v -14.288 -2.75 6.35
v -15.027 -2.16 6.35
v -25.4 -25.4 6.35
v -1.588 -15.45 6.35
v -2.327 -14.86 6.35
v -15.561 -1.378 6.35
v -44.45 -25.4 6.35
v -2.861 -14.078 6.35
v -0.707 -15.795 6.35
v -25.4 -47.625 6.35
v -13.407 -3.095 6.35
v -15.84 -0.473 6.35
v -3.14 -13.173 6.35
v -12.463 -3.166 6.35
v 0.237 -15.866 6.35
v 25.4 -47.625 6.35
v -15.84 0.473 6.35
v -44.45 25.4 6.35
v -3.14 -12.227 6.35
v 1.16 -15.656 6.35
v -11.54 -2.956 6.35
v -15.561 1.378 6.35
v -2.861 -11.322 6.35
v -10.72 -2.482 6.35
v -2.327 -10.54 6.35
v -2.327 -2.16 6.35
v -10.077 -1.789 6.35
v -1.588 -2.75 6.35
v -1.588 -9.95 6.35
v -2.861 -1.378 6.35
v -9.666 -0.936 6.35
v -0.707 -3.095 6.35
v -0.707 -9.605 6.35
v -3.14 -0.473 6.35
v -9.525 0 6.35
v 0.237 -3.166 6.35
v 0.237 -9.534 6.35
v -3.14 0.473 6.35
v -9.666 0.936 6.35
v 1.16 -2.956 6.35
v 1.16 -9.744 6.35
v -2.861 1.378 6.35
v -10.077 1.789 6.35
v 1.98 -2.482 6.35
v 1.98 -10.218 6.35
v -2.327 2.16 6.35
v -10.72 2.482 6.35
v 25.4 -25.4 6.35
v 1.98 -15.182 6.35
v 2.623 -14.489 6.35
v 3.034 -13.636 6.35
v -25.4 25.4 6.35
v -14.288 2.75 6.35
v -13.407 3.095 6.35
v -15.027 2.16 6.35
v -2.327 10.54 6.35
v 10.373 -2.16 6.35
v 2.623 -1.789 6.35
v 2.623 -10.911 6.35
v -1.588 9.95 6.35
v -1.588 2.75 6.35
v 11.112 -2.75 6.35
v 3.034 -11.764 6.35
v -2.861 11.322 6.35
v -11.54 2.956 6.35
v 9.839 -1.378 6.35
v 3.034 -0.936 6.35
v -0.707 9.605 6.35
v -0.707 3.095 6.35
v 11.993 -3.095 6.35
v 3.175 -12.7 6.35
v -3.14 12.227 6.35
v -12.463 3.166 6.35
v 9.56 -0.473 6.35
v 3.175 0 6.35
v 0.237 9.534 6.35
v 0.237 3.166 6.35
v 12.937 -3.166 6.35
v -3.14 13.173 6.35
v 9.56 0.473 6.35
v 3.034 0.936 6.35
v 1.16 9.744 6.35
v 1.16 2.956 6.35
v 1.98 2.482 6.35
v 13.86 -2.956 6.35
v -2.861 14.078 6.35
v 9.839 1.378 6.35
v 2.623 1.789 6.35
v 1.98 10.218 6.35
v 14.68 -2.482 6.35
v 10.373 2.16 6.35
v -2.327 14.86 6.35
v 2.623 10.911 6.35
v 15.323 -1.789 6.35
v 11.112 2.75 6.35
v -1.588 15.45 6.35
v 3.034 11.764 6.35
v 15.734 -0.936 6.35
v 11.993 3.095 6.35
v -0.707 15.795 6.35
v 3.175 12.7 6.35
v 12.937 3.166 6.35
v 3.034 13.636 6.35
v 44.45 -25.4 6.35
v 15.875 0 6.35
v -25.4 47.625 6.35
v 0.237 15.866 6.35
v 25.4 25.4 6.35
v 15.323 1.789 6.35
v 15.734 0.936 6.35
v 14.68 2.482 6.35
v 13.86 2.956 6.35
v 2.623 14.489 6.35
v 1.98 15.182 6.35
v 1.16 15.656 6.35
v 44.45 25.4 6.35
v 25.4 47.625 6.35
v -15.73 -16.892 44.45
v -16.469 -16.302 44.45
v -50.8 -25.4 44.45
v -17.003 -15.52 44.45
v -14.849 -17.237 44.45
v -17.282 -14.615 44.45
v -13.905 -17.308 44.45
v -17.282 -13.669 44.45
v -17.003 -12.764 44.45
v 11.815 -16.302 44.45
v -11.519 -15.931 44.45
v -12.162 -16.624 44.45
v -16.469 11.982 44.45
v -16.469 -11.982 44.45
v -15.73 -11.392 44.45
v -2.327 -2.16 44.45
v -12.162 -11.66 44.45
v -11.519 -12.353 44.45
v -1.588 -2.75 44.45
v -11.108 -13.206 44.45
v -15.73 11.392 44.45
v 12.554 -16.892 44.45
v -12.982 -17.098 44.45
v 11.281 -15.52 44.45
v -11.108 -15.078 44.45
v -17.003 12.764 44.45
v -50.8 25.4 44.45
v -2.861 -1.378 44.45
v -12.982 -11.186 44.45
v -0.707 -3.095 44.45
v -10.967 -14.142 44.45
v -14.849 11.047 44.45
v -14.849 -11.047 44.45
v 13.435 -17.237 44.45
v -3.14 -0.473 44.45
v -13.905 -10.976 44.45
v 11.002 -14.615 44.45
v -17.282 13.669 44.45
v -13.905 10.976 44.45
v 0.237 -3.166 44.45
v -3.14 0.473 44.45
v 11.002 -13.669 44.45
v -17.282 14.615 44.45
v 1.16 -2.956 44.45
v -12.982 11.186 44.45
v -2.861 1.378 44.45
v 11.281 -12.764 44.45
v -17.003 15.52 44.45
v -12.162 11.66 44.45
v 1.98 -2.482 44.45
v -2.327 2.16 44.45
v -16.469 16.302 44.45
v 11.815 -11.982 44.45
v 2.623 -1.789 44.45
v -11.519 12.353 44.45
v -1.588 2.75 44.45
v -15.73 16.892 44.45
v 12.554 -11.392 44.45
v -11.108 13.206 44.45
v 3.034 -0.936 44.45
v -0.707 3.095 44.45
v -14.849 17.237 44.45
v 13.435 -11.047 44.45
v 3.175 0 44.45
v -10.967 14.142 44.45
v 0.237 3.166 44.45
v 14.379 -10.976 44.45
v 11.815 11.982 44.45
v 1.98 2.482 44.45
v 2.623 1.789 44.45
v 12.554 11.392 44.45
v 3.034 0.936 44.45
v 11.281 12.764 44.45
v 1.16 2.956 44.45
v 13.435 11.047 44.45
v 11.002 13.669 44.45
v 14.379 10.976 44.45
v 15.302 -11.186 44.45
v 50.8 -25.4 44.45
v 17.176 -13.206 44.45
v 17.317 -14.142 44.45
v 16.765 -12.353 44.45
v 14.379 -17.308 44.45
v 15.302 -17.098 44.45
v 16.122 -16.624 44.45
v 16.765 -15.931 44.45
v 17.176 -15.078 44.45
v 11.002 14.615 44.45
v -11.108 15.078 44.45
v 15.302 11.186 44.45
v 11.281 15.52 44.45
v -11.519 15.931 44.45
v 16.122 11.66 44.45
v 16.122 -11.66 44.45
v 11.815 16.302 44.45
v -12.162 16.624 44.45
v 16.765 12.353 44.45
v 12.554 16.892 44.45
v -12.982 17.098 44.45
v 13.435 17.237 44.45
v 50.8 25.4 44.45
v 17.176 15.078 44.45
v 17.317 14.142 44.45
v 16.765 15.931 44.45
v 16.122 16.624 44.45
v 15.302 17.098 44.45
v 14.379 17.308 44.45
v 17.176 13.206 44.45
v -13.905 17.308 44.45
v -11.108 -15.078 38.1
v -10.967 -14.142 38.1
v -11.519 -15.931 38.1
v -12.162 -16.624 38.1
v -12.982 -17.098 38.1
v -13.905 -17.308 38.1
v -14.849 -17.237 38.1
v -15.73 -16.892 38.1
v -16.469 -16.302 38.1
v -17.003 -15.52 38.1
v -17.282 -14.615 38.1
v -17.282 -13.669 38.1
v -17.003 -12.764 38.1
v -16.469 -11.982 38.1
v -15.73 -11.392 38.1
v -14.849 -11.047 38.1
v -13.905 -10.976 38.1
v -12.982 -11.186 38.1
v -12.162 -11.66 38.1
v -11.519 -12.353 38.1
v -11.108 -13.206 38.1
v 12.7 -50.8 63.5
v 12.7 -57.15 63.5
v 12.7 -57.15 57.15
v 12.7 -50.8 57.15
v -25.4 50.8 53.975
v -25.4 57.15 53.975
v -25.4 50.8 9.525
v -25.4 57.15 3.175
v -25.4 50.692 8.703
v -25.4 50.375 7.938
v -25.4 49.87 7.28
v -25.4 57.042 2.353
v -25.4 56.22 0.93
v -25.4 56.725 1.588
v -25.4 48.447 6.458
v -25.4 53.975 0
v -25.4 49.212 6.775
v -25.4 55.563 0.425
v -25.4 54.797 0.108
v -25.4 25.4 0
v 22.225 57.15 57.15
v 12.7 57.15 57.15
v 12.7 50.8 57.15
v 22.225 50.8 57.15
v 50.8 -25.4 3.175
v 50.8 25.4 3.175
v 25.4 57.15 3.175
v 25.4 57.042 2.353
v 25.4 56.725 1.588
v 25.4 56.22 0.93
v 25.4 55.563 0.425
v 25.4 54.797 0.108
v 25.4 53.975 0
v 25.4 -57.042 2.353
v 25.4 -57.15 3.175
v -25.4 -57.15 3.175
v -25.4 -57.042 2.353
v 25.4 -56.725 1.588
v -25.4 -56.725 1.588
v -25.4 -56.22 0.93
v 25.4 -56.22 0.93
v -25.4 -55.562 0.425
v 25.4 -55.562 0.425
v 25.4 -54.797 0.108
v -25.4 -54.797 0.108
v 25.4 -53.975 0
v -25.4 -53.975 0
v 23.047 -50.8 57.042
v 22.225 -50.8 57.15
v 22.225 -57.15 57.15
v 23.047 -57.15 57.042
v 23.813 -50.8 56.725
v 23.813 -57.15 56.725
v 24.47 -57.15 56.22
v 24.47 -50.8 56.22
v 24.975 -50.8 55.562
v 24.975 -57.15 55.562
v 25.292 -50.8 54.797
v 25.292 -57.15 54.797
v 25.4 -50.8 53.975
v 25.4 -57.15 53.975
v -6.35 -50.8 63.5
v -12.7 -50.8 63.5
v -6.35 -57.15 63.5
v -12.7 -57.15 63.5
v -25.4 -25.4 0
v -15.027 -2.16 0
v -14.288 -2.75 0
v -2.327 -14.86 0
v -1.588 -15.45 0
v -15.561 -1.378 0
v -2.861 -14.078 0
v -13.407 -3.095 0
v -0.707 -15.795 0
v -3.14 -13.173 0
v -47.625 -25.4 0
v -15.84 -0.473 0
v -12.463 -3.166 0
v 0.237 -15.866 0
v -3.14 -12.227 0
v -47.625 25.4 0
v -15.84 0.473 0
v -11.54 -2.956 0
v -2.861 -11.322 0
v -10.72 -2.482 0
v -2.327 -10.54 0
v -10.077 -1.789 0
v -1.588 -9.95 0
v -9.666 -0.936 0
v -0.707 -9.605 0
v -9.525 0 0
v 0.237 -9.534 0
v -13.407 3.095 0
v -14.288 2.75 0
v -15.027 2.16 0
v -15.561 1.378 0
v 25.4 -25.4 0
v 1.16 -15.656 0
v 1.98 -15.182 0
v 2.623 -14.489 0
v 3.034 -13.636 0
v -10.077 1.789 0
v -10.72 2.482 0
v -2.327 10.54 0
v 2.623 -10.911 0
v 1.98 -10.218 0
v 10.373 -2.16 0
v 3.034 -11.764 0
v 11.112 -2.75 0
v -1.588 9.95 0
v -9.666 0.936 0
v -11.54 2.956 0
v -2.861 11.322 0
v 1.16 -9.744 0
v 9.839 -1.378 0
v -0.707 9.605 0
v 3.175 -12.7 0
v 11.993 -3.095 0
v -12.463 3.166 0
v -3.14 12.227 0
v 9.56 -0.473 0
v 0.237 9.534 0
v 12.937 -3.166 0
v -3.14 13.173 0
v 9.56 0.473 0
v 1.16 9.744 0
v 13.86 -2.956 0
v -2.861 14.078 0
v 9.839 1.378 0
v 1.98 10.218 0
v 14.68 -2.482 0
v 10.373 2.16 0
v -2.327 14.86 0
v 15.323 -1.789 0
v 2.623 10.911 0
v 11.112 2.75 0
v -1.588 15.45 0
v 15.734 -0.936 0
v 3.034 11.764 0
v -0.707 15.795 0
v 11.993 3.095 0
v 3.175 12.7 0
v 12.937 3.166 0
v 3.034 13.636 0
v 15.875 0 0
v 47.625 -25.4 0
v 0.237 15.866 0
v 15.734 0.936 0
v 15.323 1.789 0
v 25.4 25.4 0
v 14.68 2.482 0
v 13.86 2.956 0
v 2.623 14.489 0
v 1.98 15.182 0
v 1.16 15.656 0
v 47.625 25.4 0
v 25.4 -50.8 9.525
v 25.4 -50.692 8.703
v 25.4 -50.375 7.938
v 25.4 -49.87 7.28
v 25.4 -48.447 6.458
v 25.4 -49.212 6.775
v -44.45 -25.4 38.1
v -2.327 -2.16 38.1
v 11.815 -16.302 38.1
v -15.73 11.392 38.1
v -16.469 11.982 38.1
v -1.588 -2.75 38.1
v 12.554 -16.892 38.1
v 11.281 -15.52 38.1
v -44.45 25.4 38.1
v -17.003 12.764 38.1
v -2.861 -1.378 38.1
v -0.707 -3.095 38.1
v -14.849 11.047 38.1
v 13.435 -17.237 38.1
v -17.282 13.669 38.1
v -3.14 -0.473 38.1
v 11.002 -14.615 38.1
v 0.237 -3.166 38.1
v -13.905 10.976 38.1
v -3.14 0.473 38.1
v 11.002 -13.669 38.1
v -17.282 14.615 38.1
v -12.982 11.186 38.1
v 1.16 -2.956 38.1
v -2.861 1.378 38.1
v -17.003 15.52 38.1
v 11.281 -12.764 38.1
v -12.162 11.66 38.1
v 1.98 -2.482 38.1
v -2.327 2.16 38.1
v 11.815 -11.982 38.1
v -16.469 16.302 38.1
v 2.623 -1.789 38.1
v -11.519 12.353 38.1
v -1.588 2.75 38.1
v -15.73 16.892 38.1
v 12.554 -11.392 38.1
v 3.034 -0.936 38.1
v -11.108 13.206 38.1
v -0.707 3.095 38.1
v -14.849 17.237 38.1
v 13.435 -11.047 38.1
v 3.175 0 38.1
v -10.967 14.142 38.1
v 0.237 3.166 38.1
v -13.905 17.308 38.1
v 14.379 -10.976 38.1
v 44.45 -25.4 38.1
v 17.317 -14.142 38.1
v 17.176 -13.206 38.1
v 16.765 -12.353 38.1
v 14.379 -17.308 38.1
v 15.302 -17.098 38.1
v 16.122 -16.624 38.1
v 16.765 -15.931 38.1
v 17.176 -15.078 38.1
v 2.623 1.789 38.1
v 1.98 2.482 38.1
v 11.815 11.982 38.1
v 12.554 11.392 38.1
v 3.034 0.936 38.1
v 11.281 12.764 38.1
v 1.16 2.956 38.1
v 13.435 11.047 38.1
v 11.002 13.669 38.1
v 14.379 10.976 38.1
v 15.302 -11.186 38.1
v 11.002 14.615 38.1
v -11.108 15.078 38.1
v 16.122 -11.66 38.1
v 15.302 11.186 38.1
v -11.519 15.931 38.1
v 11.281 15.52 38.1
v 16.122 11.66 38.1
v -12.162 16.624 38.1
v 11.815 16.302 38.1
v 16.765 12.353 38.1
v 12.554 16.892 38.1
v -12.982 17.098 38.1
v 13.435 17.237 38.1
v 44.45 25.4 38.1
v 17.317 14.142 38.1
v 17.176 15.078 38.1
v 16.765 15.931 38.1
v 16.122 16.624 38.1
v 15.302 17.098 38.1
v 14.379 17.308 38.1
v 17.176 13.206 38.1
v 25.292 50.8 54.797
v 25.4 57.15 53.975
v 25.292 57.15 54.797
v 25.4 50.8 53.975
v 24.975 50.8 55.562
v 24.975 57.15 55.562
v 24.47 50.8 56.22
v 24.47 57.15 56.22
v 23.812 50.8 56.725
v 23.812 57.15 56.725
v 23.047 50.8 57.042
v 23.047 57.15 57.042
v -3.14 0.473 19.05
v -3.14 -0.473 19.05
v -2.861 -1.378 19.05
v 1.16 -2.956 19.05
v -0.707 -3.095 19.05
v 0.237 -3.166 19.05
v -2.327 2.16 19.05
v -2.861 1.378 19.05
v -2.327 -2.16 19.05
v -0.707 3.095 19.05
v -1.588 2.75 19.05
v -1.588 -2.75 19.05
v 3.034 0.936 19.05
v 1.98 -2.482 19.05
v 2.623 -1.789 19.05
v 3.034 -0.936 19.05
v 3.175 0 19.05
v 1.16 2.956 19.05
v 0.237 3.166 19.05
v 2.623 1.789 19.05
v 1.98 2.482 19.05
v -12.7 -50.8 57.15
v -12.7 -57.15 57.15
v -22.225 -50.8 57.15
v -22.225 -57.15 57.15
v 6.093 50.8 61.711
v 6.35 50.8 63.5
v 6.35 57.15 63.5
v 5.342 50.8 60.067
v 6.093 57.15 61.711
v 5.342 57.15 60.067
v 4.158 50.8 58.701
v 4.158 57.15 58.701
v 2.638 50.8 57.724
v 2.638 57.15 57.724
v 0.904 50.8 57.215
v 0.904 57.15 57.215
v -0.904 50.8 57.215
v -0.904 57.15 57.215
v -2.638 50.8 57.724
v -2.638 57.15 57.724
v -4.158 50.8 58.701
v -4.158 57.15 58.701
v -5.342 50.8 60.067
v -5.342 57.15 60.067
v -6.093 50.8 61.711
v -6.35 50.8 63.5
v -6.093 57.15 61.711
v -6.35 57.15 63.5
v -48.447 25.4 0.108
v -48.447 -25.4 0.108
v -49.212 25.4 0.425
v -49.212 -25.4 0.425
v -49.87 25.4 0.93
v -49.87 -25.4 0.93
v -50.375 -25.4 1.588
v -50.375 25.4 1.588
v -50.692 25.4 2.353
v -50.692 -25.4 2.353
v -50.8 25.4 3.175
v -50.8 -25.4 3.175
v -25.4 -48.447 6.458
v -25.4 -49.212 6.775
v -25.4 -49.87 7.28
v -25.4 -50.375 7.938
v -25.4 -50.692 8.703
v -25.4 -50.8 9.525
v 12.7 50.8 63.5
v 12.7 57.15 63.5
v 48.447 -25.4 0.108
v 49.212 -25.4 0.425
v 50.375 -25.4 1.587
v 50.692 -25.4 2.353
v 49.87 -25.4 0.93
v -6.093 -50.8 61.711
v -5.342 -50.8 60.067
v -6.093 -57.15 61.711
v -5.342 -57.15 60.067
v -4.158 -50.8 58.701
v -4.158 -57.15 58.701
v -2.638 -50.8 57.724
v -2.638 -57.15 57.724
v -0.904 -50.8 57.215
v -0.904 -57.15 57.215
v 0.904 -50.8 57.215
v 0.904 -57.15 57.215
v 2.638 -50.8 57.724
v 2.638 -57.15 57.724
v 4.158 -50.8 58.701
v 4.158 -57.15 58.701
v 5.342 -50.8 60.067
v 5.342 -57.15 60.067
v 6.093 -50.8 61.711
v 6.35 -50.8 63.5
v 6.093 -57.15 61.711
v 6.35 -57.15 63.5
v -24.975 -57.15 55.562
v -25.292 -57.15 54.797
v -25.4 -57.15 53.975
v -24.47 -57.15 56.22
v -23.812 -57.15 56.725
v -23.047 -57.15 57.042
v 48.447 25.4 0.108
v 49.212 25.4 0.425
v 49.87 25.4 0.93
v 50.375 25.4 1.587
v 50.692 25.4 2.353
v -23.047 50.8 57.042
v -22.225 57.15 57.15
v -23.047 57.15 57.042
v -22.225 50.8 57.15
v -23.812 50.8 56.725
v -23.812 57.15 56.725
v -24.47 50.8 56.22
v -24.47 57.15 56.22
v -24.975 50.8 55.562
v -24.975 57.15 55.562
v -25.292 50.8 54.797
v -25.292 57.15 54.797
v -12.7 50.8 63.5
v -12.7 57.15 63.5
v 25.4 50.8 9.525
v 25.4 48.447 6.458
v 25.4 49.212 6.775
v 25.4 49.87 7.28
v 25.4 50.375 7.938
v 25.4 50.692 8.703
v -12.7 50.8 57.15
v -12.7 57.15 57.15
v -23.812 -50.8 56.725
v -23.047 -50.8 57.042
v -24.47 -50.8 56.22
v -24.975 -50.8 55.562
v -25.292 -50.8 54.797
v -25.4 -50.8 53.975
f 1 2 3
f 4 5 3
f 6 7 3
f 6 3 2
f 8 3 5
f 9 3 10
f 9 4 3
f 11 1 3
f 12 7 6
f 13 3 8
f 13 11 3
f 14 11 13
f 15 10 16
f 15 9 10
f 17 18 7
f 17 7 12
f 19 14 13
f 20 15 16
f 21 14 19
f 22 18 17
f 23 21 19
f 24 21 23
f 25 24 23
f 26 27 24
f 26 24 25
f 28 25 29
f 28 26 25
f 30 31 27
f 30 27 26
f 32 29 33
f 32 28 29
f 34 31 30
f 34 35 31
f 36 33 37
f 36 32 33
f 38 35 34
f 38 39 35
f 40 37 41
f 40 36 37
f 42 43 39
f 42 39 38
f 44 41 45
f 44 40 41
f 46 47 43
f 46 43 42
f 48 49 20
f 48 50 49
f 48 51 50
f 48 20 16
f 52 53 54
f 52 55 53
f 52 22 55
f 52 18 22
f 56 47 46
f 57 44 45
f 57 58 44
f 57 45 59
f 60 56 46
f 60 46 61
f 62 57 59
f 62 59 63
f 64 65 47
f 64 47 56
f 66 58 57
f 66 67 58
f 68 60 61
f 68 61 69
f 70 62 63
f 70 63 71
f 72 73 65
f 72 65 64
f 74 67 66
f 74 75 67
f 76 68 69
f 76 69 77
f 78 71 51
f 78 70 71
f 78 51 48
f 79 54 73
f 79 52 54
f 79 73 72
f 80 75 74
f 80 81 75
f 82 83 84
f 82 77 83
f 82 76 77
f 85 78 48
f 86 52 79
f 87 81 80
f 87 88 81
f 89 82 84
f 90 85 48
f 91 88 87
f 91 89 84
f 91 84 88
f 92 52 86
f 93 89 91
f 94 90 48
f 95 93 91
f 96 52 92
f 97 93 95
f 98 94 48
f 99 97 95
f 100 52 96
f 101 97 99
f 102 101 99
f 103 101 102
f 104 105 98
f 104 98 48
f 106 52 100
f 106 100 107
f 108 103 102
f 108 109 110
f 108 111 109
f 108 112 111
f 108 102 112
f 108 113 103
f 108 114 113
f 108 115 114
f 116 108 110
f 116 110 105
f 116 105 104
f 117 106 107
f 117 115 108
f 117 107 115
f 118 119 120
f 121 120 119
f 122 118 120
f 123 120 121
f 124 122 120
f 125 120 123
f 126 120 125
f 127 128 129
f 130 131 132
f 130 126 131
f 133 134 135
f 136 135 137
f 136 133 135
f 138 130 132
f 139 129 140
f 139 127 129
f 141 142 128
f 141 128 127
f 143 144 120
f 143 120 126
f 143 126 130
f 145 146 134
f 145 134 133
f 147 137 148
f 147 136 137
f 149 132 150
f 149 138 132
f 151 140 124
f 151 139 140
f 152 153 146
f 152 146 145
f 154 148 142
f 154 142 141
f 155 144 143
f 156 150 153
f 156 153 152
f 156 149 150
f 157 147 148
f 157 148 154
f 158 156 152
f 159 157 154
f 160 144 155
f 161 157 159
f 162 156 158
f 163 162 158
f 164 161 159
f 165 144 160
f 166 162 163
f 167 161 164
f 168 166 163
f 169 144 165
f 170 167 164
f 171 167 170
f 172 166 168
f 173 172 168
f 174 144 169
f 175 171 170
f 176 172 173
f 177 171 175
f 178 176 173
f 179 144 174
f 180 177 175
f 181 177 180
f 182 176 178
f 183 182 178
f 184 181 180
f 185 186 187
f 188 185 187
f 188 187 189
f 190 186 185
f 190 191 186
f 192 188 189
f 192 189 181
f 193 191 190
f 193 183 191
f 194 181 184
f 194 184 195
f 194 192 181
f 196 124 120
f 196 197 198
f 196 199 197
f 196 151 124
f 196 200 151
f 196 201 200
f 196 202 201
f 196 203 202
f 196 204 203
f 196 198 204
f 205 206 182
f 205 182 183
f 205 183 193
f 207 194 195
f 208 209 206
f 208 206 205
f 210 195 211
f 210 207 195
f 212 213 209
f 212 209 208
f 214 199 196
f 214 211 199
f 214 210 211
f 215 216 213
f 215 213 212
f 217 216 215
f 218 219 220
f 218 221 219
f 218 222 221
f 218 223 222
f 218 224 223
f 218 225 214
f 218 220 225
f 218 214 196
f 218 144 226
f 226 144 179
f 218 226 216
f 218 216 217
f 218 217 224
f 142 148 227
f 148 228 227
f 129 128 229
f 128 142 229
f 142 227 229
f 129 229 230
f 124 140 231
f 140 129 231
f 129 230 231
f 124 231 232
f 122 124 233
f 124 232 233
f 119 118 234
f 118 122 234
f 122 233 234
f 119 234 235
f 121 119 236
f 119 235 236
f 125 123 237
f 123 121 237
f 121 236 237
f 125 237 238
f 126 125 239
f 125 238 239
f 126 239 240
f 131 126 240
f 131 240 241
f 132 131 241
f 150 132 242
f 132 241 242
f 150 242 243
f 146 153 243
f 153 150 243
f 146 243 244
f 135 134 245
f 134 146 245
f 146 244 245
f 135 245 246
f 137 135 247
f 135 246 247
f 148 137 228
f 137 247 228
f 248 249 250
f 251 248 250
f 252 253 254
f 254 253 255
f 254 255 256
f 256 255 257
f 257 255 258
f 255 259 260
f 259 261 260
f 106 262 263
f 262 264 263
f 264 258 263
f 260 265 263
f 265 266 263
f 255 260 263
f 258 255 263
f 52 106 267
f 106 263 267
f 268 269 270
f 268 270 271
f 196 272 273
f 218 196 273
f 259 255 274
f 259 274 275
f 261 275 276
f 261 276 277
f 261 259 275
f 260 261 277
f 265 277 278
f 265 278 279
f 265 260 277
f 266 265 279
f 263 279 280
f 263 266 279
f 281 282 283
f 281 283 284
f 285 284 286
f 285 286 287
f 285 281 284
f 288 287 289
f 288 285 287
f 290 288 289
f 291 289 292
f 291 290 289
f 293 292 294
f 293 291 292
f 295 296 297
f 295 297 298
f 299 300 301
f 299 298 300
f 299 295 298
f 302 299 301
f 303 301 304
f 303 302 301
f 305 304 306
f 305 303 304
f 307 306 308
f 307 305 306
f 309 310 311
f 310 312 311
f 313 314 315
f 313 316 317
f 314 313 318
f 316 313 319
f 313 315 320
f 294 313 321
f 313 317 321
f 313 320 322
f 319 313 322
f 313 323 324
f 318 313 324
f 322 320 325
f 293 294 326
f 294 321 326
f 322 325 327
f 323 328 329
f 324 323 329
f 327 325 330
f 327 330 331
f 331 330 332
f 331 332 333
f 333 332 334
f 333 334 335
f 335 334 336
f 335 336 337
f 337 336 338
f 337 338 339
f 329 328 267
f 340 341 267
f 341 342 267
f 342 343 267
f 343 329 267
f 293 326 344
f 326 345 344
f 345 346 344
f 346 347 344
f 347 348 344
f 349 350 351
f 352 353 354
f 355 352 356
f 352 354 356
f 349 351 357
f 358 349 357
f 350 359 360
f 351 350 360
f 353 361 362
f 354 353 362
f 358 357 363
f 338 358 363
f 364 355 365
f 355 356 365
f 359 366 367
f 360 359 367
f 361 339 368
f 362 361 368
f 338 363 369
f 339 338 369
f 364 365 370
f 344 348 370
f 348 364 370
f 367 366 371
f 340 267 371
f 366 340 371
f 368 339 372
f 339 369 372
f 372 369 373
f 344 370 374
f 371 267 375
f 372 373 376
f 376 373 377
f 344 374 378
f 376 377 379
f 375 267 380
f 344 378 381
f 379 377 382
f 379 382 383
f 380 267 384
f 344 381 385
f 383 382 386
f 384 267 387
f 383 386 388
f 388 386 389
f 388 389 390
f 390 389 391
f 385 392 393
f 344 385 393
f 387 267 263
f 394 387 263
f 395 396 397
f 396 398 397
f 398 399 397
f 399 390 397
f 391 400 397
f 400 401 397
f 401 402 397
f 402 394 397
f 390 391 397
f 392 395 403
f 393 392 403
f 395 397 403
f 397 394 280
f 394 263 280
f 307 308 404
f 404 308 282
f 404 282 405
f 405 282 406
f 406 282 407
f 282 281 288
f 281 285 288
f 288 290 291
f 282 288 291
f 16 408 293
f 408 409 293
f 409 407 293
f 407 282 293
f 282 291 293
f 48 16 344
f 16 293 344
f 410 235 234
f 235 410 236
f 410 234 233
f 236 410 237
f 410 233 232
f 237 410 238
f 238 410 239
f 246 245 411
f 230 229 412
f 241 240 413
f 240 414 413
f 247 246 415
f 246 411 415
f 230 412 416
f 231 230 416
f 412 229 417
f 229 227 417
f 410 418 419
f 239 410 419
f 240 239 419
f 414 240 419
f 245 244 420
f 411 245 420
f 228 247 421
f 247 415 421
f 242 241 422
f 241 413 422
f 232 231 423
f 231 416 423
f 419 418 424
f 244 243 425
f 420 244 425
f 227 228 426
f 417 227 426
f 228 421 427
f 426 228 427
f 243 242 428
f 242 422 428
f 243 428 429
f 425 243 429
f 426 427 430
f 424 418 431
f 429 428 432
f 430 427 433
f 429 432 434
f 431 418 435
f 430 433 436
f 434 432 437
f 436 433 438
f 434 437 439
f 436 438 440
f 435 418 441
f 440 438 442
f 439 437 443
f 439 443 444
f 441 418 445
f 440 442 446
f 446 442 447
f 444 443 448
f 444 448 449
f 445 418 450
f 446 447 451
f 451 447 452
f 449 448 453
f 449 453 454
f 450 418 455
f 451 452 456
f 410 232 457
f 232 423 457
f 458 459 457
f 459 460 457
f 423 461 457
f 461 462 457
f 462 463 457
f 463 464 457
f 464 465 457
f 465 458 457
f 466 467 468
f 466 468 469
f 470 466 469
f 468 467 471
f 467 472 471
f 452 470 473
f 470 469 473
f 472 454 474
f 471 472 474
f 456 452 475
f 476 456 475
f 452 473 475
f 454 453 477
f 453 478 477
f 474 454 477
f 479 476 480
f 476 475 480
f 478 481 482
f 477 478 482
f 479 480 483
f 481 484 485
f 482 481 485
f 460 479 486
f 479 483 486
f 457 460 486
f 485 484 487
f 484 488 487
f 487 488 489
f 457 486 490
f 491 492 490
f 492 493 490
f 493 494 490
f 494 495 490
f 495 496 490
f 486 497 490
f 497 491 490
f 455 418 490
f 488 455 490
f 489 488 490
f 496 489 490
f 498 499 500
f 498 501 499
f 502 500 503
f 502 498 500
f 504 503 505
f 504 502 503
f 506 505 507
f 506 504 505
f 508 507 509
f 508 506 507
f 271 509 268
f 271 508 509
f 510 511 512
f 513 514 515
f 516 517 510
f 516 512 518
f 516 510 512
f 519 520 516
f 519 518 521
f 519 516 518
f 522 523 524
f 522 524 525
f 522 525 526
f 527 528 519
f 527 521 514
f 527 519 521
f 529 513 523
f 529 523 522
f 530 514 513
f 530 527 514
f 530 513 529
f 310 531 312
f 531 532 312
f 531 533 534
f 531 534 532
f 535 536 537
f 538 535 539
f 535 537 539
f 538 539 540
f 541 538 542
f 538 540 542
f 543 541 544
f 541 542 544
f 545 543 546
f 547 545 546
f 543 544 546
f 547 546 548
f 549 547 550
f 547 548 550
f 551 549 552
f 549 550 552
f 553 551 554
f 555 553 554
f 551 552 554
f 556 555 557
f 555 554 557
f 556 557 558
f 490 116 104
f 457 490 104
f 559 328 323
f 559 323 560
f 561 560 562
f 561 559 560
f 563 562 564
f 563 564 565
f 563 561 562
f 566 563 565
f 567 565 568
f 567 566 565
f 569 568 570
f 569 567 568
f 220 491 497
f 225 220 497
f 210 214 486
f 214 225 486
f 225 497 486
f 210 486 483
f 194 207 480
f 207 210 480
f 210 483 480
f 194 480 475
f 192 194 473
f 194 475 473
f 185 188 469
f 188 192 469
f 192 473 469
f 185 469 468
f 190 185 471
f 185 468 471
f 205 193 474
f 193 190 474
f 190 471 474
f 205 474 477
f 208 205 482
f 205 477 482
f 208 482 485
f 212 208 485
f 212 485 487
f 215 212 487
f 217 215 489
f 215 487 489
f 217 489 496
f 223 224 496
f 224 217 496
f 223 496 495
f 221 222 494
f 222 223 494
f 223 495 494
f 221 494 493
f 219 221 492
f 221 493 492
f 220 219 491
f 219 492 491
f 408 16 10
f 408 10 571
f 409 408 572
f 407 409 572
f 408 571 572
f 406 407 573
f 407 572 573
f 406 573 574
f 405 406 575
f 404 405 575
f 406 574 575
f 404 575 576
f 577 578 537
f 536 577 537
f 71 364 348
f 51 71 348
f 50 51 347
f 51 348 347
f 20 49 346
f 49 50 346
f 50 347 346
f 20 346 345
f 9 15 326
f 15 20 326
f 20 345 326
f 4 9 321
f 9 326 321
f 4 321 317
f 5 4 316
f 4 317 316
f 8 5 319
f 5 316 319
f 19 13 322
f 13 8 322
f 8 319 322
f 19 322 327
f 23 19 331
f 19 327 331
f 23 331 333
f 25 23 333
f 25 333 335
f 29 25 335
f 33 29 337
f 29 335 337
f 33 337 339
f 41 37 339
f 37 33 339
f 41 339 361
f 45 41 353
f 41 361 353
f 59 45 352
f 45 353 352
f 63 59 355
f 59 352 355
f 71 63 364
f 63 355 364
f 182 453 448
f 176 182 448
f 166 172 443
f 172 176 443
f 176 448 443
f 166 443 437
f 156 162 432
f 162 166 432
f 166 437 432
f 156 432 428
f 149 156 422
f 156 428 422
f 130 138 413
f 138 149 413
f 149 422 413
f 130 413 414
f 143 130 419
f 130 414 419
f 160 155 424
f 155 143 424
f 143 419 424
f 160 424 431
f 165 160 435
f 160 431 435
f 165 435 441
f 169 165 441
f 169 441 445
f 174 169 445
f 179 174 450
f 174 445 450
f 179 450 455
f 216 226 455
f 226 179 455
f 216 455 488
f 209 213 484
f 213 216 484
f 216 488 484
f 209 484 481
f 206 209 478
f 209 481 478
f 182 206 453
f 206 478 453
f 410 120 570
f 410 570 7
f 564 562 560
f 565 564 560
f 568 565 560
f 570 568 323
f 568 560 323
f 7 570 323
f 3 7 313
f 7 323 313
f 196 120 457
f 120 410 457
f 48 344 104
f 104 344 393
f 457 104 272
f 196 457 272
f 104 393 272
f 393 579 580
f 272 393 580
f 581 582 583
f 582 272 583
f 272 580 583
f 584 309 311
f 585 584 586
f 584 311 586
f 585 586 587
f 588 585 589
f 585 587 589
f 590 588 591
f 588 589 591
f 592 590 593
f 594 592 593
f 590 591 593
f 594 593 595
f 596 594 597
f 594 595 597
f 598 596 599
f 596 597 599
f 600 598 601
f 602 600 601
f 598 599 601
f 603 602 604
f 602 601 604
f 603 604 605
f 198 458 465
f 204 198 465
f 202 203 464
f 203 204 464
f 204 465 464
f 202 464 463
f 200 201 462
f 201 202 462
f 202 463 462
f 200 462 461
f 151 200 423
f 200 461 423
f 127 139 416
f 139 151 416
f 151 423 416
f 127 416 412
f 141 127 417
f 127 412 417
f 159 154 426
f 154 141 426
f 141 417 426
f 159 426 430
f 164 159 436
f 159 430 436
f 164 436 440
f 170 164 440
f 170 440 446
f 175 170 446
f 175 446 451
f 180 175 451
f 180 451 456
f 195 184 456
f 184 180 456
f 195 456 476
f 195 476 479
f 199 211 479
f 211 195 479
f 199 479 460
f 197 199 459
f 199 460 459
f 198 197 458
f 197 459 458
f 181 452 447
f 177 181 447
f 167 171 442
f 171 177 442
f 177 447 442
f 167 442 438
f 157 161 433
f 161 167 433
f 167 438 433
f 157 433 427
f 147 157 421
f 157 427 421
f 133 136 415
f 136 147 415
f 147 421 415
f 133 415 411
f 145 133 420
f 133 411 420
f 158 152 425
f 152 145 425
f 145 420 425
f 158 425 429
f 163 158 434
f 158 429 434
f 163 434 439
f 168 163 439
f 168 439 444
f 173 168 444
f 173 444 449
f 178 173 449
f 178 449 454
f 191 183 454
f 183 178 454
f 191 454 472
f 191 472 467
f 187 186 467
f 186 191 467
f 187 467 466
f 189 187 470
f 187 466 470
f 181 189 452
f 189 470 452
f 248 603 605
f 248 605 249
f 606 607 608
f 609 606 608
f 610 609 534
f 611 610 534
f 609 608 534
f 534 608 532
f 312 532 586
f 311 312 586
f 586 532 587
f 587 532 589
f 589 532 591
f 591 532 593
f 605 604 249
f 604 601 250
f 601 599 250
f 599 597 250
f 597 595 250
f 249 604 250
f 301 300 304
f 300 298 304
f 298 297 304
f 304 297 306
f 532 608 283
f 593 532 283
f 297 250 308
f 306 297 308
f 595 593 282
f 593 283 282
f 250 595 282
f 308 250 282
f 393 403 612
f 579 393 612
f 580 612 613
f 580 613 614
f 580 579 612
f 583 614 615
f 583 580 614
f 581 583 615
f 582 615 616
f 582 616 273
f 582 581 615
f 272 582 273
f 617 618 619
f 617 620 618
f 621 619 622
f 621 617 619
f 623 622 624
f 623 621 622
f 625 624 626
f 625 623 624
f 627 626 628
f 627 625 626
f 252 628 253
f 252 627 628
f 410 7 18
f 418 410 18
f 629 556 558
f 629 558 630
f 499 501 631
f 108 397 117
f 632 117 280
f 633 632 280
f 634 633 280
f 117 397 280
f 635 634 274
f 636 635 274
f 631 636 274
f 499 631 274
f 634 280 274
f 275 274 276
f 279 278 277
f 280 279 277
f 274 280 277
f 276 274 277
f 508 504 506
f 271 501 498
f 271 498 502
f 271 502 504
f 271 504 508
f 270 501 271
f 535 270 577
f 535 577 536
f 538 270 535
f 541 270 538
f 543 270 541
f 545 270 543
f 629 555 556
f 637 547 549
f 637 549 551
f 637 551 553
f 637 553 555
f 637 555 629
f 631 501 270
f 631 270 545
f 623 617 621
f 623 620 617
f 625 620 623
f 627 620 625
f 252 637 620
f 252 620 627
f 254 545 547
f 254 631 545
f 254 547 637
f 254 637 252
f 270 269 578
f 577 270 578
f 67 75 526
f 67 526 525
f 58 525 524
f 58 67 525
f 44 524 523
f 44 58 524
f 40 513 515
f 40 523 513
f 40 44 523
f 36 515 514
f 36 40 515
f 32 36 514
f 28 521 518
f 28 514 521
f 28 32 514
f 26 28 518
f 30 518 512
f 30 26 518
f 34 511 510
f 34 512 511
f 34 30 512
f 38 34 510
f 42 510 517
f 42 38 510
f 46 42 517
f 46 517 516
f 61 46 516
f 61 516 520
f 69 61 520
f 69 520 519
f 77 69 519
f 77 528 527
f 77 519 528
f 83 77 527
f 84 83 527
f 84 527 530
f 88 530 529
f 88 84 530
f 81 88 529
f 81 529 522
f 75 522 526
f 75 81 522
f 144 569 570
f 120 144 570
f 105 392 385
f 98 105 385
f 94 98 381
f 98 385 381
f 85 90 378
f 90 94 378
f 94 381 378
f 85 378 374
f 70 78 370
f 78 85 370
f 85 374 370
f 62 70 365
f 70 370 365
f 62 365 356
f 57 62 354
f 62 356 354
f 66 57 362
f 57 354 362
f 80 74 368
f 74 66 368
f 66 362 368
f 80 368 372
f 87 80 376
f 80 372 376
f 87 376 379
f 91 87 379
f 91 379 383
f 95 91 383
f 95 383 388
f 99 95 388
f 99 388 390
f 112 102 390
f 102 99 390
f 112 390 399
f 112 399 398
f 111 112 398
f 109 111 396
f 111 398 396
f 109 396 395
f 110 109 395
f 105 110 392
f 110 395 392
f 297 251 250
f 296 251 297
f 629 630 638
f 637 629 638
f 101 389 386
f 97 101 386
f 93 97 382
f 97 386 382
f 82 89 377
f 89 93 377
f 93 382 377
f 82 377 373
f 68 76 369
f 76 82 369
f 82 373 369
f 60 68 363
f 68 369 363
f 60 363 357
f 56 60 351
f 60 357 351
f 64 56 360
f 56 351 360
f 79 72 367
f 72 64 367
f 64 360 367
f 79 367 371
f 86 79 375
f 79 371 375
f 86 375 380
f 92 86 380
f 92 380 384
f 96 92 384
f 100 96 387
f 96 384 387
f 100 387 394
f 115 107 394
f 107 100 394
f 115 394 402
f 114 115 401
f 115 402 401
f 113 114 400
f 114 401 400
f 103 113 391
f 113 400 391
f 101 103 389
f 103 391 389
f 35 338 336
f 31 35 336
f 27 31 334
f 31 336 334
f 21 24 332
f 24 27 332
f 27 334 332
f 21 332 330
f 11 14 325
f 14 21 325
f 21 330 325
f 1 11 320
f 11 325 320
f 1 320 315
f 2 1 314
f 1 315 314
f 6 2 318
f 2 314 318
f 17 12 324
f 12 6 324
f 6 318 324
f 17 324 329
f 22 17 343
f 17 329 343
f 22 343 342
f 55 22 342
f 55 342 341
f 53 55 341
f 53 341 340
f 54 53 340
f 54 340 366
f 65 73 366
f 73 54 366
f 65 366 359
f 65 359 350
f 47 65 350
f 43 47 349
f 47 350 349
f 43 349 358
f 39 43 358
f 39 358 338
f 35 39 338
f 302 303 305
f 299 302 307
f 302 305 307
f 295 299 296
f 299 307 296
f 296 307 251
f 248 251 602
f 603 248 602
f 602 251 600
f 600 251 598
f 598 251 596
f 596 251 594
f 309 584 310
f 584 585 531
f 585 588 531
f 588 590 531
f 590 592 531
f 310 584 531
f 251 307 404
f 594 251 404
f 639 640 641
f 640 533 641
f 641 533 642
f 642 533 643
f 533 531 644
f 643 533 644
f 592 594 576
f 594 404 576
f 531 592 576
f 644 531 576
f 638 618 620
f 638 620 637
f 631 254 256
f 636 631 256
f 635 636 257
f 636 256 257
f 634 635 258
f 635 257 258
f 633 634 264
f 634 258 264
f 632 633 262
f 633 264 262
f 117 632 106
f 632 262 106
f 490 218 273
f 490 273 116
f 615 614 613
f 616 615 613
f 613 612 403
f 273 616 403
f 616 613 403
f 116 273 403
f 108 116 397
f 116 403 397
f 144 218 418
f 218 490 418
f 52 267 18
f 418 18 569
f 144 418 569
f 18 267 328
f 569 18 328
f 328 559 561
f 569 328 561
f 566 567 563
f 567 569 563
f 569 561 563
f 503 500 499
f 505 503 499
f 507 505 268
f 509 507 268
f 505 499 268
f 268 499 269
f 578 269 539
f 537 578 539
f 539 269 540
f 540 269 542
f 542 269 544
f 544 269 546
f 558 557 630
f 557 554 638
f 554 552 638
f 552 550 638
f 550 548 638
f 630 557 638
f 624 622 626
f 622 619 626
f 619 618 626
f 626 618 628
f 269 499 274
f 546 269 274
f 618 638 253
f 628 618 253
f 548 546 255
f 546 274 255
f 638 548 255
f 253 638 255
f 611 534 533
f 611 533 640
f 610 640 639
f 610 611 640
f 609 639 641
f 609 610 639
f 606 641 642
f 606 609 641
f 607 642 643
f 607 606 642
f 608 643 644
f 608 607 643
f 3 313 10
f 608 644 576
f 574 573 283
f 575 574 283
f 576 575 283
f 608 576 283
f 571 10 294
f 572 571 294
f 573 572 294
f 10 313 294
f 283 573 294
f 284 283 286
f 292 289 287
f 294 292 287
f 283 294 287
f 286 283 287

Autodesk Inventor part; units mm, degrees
ref_plane "YZ Plane" through (0, 0, 0) normal (1, 0, 0) x (0, 1, 0)
ref_plane "XZ Plane" through (0, 0, 0) normal (0, 1, 0) x (-1, 0, 0)
ref_plane "XY Plane" through (0, 0, 0) normal (0, 0, 1) x (1, 0, 0)
sketch "Sketch1" plane through (0, 0, 0) normal (0, 0, 1) x (1, 0, 0)
  circle A0 centre (0, -12.7) radius 3.175
  circle A1 centre (12.7, 0) radius 3.175
  circle A2 centre (0, 12.7) radius 3.175
  circle A3 centre (-12.7, 0) radius 3.175
  line L0 (25.4, 57.15) -> (-25.4, 57.15)
  line L1 (-25.4, 57.15) -> (-25.4, -57.15)
  line L2 (-25.4, -57.15) -> (25.4, -57.15)
  line L3 (25.4, -57.15) -> (25.4, 57.15)
  point P0 (0, 0)
  dimension "d1" = 6.35
  dimension "d2" = 12.7
  dimension "d5" = 360
  dimension "d13" = 25.4
  dimension "d14" = 57.15
  dimension "d15" = 57.15
  dimension "d16" = 25.4
extrude "Extrusion3" add sketch "Sketch1" along normal blind 6.35
sketch "Sketch3" plane through (0, 0, 6.35) normal (0, 0, 1) x (1, 0, 0)
  line L0 (25.4, 57.15) -> (-25.4, 57.15) projected
  line L1 (25.4, 57.15) -> (25.4, 50.8)
  line L2 (25.4, -57.15) -> (25.4, 57.15) projected
  line L3 (25.4, 50.8) -> (-25.4, 50.8)
  line L4 (-25.4, 57.15) -> (-25.4, -57.15) projected
  line L5 (-25.4, 57.15) -> (25.4, 57.15)
  line L6 (-25.4, -57.15) -> (25.4, -57.15) projected
  line L7 (25.4, -57.15) -> (25.4, -50.8)
  line L8 (25.4, -50.8) -> (-25.4, -50.8)
  line L9 (-25.4, -50.8) -> (-25.4, -57.15)
  line L10 (-25.4, -57.15) -> (25.4, -57.15)
  point P0 (0, 0)
  dimension "d19" = 6.35
  dimension "d20" = 6.35
extrude "Extrusion4" add sketch "Sketch3" along normal blind 50.8 contours L1 L3 L4 L0 | L2 L6 L4 L8
fillet "Fillet1" radius 3.175 8 edges at (25.4, 53.975, 57.15) (25.4, -53.975, 57.15) (-25.4, -53.975, 57.15) (-25.4, 53.975, 57.15) (0, -57.15, 0) (0, 57.15, 0) (0, -50.8, 6.35) (0, 50.8, 6.35)
sketch "Sketch6" plane through (0, 0, 6.35) normal (0, 0, 1) x (1, 0, 0)
  circle A0 centre (0, 0) radius 3.175
  dimension "d50" = 6.35
extrude "Extrusion6" add sketch "Sketch6" along normal blind 12.7
sketch "Sketch7" plane through (-25.4, 57.15, 3.175) normal (0, 1, 0) x (1, 0, 0)
  line L0 (47.625, -53.975) -> (3.175, -53.975) projected
  line L1 (0, 0) -> (0, -50.8) projected
  line L2 (47.625, -53.975) -> (3.175, -53.975) projected
  line L3 (38.1, -53.975) -> (38.1, -60.325)
  line L4 (12.7, -60.325) -> (12.7, -53.975)
  line L5 (38.1, -60.325) -> (31.75, -60.325)
  line L6 (19.05, -60.325) -> (12.7, -60.325)
  line L7 (38.1, -53.975) -> (12.7, -53.975)
  arc A0 (31.75, -60.325) -> (25.4, -53.975) centre (25.4, -60.325) ccw
  arc A1 (25.4, -53.975) -> (19.05, -60.325) centre (25.4, -60.325) ccw
  point P0 (25.4, 3.175)
  dimension "d57" = 38.1
  dimension "d58" = 12.7
  dimension "d59" = 6.35
  dimension "d60" = 6.35
  dimension "d66" = 6.35
  dimension "d67" = 25.4
  dimension "d68" = 6.35
  dimension "d69" = 25.4
extrude "Extrusion7" add sketch "Sketch7" against normal blind 6.35
sketch "Sketch8" plane through (-25.4, -57.15, 3.175) normal (0, -1, 0) x (1, 0, 0)
  line L0 (12.7, 53.975) -> (12.7, 60.325) projected
  line L1 (12.7, 53.975) -> (12.7, 60.325)
  line L2 (38.1, 60.325) -> (38.1, 53.975) projected
  line L3 (38.1, 60.325) -> (38.1, 53.975)
  line L4 (38.1, 53.975) -> (25.4, 53.975)
  line L5 (47.625, 53.975) -> (3.175, 53.975) projected
  line L6 (12.7, 53.975) -> (25.4, 53.975)
  line L7 (12.7, 60.325) -> (19.05, 60.325) projected
  line L8 (12.7, 60.325) -> (19.05, 60.325)
  line L9 (31.75, 60.325) -> (38.1, 60.325) projected
  line L10 (38.1, 60.325) -> (31.75, 60.325)
  arc A0 (19.05, 60.325) -> (25.4, 53.975) centre (25.4, 60.325) ccw
  arc A1 (25.4, 53.975) -> (31.75, 60.325) centre (25.4, 60.325) ccw
  line L11 (0, 0) -> (0, 50.8) projected
  point P0 (25.4, -3.175)
  dimension "d72" = 6.35
  dimension "d73" = 6.35
  dimension "d74" = 25.4
  dimension "d75" = 25.4
extrude "Extrusion8" add sketch "Sketch8" against normal blind 6.35
sketch "Sketch9" plane through (0, 0, 6.35) normal (0, 0, 1) x (1, 0, 0)
  line L0 (-50.8, 25.4) -> (50.8, 25.4)
  line L1 (50.8, 25.4) -> (50.8, -25.4)
  line L2 (50.8, -25.4) -> (-50.8, -25.4)
  line L3 (-50.8, -25.4) -> (-50.8, 25.4)
  line L4 (-50.8, 25.4) -> (50.8, -25.4) construction
  line L5 (50.8, 25.4) -> (-50.8, -25.4) construction
  line L6 (25.4, -47.625) -> (25.4, 47.625) projected
  line L7 (25.4, 25.4) -> (25.4, -25.4)
  line L8 (-25.4, 53.975) -> (-25.4, -53.975) projected
  line L9 (-25.4, 25.4) -> (-25.4, -25.4)
  point P0 (0, 0)
  dimension "d78" = 101.6
  dimension "d79" = 50.8
extrude "Extrusion9" add sketch "Sketch9" against normal blind 6.35 contours L0 L8 L2 L3 | L0 L1 L2 L6
sketch "Sketch11" plane through (0, 0, 6.35) normal (0, 0, 1) x (1, 0, 0)
  line L0 (-25.4, -25.4) -> (-50.8, -25.4) projected
  line L1 (-50.8, -25.4) -> (-44.45, -25.4)
  line L2 (-44.45, -25.4) -> (-44.45, 25.4)
  line L3 (-25.4, 25.4) -> (-50.8, 25.4) projected
  line L4 (-50.8, -25.4) -> (-50.8, 25.4) projected
  line L5 (-50.8, 25.4) -> (-50.8, -25.4)
  line L6 (50.8, -25.4) -> (50.8, 25.4) projected
  line L7 (50.8, -25.4) -> (50.8, 25.4)
  line L8 (25.4, 25.4) -> (50.8, 25.4) projected
  line L9 (50.8, 25.4) -> (44.45, 25.4)
  line L10 (44.45, 25.4) -> (44.45, -25.4)
  line L11 (50.8, -25.4) -> (25.4, -25.4) projected
  line L12 (44.45, -25.4) -> (50.8, -25.4)
  point P0 (0, 0)
  dimension "d84" = 6.35
  dimension "d85" = 6.35
extrude "Extrusion11" add sketch "Sketch11" along normal blind 31.75
fillet "Fillet3" radius 3.175 2 edges at (50.8, 0, 0) (-50.8, 0, 0)
sketch "Sketch18" plane through (0, 0, 38.1) normal (0, 0, 1) x (1, 0, 0)
  line L0 (-50.8, 25.4) -> (-50.8, -25.4) projected
  line L1 (-50.8, -25.4) -> (50.8, -25.4)
  line L2 (50.8, -25.4) -> (50.8, 25.4)
  line L3 (50.8, 25.4) -> (-50.8, 25.4)
  line L4 (-50.8, 25.4) -> (-50.8, -25.4)
  circle A0 centre (-14.142, -14.142) radius 3.175
  circle A1 centre (14.142, -14.142) radius 3.175
  circle A2 centre (14.142, 14.142) radius 3.175
  circle A3 centre (-14.142, 14.142) radius 3.175
  circle A4 centre (0, 0) radius 3.175
  dimension "d132" = 6.35
  dimension "d137" = 360
  dimension "d139" = 6.35
  dimension "d142" = 14.142
  dimension "d143" = 14.142
extrude "Extrusion16" add sketch "Sketch18" along normal blind 6.35
properties part number "ShoulderPlateXZ"
